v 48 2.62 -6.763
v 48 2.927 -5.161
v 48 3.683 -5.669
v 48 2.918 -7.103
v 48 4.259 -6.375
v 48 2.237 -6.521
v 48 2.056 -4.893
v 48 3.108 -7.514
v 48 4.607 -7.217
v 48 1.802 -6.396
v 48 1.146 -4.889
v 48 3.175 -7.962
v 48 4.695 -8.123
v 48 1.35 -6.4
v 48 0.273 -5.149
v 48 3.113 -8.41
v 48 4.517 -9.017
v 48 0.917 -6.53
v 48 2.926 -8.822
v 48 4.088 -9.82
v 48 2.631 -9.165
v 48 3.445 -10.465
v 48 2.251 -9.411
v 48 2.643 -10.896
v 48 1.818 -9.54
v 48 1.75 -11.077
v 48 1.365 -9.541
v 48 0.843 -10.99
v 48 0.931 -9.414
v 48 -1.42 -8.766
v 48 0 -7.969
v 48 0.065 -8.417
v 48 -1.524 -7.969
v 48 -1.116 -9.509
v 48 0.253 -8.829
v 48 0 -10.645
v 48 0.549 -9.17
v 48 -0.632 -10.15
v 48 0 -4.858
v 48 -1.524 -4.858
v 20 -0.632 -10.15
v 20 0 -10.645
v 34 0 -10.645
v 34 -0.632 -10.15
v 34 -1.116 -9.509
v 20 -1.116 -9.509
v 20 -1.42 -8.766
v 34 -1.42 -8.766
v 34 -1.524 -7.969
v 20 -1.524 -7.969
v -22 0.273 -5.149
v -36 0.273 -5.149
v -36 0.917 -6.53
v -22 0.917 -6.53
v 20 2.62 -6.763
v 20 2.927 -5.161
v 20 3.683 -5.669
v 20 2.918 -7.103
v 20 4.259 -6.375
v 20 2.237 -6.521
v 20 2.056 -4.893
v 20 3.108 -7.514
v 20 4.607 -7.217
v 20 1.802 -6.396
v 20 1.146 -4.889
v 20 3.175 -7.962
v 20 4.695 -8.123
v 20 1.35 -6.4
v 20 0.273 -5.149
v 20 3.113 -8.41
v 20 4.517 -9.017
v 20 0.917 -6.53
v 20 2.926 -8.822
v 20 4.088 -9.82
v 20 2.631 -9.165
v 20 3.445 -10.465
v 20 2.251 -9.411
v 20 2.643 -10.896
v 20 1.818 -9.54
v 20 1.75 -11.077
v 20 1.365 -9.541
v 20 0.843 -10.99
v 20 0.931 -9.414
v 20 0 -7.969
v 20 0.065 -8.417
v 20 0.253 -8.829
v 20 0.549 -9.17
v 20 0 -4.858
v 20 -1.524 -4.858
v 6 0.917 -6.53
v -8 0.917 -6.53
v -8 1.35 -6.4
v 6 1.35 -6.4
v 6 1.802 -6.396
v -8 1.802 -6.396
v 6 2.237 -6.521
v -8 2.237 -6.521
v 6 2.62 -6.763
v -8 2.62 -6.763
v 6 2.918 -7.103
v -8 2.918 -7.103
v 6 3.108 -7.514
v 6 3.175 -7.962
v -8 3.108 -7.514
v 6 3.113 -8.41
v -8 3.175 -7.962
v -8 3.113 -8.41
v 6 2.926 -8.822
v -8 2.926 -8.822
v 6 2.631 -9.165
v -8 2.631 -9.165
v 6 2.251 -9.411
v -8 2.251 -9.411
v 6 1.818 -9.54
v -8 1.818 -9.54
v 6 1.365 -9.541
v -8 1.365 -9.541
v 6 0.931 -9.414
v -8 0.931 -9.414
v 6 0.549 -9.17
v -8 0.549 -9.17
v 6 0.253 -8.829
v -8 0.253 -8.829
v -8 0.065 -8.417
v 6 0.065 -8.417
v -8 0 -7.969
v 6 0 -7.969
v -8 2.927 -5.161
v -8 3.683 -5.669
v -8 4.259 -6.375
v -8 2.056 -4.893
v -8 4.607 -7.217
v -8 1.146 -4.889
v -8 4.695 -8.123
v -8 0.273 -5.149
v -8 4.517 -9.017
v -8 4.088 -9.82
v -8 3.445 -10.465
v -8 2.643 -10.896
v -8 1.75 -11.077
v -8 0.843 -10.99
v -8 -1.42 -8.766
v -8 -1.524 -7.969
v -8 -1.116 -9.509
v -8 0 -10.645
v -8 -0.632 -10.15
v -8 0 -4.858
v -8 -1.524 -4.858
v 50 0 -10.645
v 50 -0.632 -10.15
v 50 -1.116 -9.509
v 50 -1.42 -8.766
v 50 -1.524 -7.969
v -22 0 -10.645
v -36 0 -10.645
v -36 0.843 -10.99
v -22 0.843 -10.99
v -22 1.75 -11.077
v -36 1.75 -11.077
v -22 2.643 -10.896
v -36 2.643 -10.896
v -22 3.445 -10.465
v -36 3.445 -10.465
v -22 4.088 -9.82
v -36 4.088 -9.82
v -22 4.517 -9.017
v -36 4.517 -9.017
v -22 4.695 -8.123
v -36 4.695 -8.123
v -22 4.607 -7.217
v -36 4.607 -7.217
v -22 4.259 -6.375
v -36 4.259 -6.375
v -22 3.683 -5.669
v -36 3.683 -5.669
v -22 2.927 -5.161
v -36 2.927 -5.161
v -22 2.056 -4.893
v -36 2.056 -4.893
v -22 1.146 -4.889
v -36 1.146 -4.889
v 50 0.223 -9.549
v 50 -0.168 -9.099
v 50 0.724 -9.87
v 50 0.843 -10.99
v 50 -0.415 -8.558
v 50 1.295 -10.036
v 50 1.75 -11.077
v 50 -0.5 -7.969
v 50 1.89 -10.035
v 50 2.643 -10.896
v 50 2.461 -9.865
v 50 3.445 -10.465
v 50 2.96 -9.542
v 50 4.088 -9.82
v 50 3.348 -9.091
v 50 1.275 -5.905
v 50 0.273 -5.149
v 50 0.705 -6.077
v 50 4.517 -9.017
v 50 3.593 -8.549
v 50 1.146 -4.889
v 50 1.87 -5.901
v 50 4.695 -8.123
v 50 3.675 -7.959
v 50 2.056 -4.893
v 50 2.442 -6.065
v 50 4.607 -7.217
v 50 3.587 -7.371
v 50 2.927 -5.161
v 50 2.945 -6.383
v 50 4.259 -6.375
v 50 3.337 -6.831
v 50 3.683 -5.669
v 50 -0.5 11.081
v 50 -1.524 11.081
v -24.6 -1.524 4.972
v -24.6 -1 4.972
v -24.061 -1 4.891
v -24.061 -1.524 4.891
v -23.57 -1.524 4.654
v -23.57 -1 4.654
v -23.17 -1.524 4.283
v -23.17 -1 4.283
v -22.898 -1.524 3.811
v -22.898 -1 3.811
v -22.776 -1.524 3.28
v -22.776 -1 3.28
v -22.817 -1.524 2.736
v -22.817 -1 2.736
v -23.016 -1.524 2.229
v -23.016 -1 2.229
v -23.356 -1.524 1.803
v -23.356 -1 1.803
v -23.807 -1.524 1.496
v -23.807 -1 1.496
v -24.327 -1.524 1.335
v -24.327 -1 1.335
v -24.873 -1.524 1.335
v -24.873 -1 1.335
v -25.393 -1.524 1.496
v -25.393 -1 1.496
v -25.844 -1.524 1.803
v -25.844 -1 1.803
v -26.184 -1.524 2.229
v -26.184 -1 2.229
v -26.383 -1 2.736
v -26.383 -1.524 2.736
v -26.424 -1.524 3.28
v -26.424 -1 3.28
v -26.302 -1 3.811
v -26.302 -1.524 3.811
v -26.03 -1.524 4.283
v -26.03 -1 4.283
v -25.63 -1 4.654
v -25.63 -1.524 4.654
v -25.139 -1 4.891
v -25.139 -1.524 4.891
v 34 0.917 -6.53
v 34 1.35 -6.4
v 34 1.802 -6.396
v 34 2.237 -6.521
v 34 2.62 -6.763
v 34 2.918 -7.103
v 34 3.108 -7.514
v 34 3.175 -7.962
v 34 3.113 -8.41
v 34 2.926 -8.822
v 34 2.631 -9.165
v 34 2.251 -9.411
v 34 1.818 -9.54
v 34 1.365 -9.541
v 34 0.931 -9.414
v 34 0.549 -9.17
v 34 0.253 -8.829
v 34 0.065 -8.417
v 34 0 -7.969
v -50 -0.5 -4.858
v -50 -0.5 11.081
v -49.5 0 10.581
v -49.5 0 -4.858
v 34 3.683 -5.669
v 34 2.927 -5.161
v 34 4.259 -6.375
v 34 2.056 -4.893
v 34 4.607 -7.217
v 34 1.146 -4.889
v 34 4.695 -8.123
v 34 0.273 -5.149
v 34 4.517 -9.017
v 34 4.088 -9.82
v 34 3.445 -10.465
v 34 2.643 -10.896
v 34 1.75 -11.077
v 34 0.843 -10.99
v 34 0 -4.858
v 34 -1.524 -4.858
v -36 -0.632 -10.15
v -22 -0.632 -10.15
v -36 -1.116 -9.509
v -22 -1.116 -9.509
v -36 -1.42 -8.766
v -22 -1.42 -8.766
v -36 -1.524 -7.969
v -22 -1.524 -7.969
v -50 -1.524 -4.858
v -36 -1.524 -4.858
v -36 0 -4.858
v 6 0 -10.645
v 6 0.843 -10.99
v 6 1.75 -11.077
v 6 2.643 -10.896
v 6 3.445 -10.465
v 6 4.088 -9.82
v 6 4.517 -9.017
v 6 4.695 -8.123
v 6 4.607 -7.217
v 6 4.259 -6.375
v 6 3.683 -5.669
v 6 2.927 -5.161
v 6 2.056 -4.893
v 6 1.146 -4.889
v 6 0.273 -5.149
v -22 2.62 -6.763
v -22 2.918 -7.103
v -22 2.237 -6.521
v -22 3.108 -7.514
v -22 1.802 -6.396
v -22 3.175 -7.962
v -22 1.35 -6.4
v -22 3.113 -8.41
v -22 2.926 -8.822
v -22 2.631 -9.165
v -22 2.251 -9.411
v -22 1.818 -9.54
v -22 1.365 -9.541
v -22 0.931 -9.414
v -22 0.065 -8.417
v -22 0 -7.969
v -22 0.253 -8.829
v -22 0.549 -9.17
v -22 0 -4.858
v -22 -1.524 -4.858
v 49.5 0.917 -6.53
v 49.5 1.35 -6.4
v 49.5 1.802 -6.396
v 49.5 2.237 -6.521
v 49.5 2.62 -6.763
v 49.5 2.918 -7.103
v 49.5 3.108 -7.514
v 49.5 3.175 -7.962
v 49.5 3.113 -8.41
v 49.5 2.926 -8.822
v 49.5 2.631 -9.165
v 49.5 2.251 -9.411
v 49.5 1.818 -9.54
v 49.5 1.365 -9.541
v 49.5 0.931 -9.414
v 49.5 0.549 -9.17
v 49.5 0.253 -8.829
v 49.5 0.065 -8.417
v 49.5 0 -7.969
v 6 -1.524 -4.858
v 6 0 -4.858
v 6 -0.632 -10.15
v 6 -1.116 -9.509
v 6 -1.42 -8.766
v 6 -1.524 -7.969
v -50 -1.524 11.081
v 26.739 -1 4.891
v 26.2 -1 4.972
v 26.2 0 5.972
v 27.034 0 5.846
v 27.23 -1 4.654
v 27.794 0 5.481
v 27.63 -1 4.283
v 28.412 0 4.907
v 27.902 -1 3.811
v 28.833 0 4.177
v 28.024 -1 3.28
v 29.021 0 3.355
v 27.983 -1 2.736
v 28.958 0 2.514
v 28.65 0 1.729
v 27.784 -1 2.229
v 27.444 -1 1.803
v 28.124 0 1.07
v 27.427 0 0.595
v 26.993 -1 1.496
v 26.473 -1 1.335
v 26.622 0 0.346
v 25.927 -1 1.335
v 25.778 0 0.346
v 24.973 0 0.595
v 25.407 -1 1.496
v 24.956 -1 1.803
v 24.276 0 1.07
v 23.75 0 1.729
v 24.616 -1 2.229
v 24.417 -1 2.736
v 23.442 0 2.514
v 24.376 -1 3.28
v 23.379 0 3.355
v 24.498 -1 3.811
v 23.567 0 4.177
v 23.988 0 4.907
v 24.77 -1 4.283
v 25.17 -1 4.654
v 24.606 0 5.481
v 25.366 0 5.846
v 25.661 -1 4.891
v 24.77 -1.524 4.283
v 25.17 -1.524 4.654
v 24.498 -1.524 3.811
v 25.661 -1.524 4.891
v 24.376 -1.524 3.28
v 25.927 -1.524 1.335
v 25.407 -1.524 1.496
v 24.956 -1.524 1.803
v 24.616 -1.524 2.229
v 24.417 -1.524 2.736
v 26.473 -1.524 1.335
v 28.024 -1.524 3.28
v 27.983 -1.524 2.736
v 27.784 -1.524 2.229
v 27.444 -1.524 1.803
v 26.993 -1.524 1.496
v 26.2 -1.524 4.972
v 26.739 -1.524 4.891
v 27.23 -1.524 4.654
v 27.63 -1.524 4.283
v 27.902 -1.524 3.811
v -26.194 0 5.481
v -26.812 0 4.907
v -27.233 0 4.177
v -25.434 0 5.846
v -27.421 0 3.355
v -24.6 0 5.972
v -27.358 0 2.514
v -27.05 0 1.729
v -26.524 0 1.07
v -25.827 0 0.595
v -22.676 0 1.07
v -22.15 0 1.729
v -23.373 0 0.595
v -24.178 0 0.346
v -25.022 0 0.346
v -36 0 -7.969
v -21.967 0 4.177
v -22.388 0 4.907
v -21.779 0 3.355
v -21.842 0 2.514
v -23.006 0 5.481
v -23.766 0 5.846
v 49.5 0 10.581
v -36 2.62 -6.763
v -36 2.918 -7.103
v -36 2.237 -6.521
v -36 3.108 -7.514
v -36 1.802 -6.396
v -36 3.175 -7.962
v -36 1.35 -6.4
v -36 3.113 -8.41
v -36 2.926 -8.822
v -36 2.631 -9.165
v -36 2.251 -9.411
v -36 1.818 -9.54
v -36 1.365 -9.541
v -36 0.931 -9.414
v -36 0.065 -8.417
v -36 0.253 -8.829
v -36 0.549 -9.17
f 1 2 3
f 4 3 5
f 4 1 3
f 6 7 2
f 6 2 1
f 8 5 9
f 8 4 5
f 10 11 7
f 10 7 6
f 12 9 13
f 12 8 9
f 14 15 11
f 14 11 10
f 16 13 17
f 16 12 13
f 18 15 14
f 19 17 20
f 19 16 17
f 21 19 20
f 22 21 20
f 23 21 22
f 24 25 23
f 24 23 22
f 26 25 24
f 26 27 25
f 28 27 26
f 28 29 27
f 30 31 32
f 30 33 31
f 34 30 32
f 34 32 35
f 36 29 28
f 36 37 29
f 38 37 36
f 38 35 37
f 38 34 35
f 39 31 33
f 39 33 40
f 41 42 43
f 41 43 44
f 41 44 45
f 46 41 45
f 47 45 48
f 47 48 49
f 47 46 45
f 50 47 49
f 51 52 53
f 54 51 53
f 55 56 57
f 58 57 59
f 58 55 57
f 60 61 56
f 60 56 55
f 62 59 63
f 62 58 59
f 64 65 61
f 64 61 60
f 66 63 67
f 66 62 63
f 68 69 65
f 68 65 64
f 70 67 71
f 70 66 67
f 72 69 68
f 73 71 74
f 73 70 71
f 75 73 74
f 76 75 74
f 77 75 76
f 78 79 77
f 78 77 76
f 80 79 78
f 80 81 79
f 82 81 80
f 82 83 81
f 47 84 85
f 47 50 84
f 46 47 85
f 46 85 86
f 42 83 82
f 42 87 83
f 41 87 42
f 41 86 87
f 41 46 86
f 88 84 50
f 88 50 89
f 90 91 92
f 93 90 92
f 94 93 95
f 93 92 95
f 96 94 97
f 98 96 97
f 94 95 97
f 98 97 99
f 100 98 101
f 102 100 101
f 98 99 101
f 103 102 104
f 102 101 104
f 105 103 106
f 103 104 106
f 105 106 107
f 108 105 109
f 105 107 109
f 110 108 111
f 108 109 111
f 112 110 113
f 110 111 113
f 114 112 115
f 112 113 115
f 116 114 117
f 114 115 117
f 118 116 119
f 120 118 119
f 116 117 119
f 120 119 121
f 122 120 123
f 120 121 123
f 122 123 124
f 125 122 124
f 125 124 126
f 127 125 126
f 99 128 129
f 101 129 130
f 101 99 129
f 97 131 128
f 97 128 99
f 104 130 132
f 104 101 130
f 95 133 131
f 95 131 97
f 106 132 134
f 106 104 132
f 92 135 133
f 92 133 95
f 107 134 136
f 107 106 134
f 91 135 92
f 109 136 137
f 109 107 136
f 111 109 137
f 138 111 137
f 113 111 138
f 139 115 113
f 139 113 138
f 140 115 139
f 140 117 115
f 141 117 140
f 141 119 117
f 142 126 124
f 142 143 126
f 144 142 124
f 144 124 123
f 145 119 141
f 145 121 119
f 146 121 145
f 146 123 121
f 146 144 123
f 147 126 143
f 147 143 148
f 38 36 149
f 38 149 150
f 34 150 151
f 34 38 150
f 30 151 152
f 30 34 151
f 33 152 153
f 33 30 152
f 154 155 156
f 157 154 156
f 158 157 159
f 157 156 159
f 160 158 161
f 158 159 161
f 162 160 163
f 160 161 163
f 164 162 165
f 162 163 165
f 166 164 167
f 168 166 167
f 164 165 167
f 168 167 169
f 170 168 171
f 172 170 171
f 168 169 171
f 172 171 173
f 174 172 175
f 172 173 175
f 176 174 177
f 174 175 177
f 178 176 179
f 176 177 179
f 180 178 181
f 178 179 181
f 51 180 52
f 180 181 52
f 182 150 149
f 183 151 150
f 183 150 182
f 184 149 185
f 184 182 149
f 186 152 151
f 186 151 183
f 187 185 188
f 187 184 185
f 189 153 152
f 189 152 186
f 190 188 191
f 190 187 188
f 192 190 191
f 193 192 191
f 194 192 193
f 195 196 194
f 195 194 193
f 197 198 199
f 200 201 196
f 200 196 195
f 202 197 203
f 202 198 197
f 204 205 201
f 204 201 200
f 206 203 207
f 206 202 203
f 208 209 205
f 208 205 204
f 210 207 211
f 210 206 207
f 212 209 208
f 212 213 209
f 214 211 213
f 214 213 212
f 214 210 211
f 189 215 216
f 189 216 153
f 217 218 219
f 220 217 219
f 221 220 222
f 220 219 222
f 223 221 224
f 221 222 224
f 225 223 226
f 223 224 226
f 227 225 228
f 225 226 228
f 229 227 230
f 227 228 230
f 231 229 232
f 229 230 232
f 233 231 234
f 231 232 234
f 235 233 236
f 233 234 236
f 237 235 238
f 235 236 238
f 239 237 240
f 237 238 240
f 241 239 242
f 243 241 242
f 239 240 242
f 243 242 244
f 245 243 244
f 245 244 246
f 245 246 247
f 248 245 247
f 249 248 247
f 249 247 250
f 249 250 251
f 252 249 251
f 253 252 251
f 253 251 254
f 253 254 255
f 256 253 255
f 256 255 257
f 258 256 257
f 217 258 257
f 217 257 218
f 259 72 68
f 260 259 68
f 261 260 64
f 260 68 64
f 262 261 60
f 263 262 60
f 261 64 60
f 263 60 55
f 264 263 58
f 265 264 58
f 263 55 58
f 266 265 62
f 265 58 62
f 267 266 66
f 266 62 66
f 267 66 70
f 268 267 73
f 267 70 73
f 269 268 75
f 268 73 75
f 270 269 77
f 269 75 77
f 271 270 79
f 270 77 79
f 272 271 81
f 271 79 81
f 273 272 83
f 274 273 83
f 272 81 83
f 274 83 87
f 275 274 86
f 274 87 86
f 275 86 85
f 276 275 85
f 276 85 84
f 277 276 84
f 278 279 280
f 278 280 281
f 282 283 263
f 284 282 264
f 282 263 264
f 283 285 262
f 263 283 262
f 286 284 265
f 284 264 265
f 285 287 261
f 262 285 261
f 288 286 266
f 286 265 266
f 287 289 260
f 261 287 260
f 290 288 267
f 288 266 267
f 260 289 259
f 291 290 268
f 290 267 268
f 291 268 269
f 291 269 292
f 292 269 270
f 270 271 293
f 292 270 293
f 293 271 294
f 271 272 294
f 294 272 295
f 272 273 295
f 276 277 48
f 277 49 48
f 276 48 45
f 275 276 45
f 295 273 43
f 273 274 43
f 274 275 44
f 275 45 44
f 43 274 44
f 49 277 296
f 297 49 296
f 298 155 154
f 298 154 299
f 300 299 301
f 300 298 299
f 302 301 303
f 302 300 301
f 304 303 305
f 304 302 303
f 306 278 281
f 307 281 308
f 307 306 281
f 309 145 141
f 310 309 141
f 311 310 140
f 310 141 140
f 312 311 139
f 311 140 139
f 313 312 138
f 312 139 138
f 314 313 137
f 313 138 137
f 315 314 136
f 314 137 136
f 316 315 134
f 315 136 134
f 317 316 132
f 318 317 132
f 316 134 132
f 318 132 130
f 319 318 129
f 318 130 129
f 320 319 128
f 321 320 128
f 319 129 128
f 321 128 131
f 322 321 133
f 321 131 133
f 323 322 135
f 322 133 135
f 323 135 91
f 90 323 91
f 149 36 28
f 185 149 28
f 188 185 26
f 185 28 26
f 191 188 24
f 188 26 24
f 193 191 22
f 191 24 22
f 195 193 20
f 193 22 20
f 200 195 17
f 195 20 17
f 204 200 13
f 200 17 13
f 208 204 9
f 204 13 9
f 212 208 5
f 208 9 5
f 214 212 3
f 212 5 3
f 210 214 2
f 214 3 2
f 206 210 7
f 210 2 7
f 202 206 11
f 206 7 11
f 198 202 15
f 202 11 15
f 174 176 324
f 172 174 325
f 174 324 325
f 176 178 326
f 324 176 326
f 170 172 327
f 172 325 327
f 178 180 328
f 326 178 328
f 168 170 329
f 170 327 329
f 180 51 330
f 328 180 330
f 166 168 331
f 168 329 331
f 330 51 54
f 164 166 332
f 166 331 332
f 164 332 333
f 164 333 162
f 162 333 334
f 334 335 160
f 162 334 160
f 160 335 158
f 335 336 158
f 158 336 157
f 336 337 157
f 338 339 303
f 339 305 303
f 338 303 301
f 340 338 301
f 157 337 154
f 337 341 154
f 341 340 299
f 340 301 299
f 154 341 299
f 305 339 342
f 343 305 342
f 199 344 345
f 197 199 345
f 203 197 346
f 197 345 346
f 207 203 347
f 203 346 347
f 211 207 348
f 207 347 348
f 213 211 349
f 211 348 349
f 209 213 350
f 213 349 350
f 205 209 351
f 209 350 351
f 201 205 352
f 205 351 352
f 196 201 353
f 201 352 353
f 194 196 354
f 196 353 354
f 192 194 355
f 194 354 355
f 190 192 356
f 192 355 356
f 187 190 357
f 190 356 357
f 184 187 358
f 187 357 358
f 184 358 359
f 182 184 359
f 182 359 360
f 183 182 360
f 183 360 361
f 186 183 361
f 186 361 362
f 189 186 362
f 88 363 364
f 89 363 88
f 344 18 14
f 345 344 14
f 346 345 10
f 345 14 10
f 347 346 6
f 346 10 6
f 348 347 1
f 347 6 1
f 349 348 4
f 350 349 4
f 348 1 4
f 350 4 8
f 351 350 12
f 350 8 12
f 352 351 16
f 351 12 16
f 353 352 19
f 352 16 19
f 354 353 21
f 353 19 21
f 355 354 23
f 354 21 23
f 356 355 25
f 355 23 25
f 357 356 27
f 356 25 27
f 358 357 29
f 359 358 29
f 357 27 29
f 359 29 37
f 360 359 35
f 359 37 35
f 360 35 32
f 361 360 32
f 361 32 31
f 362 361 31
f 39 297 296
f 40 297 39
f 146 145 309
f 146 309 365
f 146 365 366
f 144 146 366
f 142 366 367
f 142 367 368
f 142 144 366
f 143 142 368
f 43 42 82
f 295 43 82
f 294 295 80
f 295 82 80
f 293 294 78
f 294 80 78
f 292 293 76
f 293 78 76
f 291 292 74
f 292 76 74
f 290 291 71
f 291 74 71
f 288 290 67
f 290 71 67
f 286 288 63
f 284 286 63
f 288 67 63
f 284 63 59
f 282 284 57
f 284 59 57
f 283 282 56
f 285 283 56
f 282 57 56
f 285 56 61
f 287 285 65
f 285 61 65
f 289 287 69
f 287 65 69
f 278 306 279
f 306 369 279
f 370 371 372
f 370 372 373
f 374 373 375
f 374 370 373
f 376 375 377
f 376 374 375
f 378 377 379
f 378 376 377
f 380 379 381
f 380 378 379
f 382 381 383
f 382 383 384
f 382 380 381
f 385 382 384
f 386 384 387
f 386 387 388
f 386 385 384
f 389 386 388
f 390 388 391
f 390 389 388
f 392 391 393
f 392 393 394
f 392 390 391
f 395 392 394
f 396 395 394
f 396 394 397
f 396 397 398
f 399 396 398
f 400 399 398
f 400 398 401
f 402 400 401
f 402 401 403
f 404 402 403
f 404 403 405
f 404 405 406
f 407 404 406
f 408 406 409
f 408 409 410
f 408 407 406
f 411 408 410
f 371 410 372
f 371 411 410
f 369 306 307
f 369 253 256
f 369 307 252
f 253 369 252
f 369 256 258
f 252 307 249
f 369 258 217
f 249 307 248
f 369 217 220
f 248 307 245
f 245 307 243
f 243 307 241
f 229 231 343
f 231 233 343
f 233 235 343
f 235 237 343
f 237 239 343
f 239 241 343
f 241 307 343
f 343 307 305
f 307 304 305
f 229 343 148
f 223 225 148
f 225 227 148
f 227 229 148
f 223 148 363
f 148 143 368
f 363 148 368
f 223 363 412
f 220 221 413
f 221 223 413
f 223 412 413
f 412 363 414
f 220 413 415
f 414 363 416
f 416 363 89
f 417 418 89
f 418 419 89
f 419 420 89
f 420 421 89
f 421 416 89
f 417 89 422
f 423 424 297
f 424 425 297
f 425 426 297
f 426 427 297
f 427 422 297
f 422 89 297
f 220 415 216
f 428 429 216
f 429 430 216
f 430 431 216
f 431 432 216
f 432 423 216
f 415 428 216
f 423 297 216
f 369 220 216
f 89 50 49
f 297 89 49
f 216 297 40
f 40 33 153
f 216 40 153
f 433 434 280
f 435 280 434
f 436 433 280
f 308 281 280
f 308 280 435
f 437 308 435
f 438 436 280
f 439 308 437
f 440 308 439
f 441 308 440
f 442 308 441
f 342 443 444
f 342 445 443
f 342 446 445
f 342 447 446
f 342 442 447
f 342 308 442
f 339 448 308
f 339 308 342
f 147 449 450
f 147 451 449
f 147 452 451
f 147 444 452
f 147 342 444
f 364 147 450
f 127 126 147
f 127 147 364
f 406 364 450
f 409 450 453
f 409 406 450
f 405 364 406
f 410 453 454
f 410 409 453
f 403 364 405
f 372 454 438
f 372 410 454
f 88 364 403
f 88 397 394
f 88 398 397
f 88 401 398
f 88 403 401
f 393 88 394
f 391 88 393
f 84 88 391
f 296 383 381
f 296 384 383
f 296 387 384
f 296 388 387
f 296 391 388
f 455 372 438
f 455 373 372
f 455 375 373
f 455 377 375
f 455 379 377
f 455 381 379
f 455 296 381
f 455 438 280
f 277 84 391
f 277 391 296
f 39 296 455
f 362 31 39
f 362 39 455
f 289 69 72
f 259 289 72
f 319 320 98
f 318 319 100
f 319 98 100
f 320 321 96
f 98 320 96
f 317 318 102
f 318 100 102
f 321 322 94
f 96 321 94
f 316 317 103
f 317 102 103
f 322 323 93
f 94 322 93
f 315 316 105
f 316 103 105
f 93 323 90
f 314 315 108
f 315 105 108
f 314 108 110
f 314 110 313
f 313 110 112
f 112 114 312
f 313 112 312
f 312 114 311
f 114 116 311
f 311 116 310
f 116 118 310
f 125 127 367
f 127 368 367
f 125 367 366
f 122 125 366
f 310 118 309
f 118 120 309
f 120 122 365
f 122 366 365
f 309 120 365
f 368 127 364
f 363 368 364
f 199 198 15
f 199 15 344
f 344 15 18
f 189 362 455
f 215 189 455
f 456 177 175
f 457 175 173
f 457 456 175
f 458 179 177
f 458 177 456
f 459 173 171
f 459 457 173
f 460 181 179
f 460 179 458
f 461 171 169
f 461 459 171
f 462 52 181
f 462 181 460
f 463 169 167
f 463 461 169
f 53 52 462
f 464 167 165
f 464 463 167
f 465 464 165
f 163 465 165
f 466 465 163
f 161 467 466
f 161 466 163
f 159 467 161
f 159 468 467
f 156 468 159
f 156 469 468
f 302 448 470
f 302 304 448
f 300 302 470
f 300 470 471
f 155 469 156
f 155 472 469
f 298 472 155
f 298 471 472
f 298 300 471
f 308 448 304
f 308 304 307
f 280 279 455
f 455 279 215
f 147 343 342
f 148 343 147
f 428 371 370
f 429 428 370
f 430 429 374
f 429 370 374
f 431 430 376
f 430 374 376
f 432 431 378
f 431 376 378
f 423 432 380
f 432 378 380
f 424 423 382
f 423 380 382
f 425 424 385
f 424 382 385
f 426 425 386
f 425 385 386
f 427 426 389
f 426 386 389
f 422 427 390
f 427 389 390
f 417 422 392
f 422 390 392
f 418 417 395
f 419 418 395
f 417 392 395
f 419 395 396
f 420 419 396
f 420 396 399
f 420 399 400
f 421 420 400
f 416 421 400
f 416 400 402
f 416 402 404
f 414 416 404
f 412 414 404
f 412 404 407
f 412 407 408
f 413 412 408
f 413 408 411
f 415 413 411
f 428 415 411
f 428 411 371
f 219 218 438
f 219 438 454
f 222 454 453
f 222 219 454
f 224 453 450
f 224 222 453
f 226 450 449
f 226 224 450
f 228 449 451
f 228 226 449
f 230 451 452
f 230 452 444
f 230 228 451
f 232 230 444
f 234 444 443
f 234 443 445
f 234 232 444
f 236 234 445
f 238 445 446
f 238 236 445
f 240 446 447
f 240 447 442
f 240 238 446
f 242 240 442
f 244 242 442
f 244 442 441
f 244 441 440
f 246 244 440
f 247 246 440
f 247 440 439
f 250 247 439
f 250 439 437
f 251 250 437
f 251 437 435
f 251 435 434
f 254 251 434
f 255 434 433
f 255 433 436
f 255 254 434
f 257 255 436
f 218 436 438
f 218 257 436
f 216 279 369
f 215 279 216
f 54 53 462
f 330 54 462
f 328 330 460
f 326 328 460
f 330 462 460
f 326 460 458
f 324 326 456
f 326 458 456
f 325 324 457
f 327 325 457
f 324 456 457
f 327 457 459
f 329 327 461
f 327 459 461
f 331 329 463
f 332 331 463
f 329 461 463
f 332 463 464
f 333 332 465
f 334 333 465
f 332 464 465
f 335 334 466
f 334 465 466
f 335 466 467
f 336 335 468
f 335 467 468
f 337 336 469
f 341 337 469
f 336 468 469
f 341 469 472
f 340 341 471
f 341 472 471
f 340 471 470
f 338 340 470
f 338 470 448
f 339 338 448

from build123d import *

# Parameters (mm, degrees)
SKETCH1_W          = 100
SKETCH1_H          = 22.1615
BASE_FLANGE1_DEPTH = 1.524
HEM1_START         = -50
HEM1_DEPTH         = 100
HEM1_2_DEPTH       = 100
CUT_EXTRUDE1_START = -52.42823759
SKETCH8_W          = 14
SKETCH8_H          = 6.223
CUT_EXTRUDE1_DEPTH = 94.856475179
LPATTERN1_COUNT    = 11
LPATTERN1_PITCH    = 28
CHAMFER1_SIZE      = 0.5
SKETCH9_R          = 1.8288
CUT_EXTRUDE2_DEPTH = 10
LPATTERN2_COUNT    = 6
LPATTERN2_PITCH    = 50.8
CHAMFER2_SIZE      = 1


# Read off the part's stored shape, not the designer's step: Hem1
# Sheet-metal steps are written as plain solids
with BuildPart() as part:
    # Sketch1 → Base-Flange1 (new body)
    with BuildSketch(Plane(origin=(0, 0, 0), x_dir=(1, 0, 0), z_dir=(0, 1, 0))):
        Rectangle(SKETCH1_W, SKETCH1_H)
    extrude(amount=-BASE_FLANGE1_DEPTH)

    # Hem1 outline → Hem1 (cut)
    with BuildSketch(Plane.YZ.offset(HEM1_START)):
        with BuildLine():
            Line((0, -11.08075), (0, -10.645306054))
            ThreePointArc((0, -10.645306054), (-1.116287945, -9.509043168), (-1.524, -7.96925))
            Line((-1.524, -7.96925), (-1.524, -11.08075))
            Line((-1.524, -11.08075), (0, -11.08075))
        make_face()
    extrude(amount=HEM1_DEPTH, mode=Mode.SUBTRACT)

    # Hem1 2 outline → Hem1 2 (add)
    with BuildSketch(Plane.YZ.offset(HEM1_START)):
        with BuildLine():
            Line((0.272523279, -5.149273321), (0.916593509, -6.530486388))
            ThreePointArc((0.916593509, -6.530486388), (2.92638392, -8.822213128), (0, -7.96925))
            Line((0, -7.96925), (0, -10.645306054))
            ThreePointArc((0, -10.645306054), (4.69518189, -8.123345818), (0.272523279, -5.149273321))
        make_face()
    extrude(amount=HEM1_2_DEPTH)

    # Sketch8 → Cut-Extrude1 (cut)
    with BuildSketch(Plane(origin=(0, 0, 0), x_dir=(1, 0, 0), z_dir=(0, 1, 0)).offset(CUT_EXTRUDE1_START)):
        with Locations((-43, 7.96925)):
            Rectangle(SKETCH8_W, SKETCH8_H)
    cut_extrude1 = extrude(amount=CUT_EXTRUDE1_DEPTH, mode=Mode.SUBTRACT)

    # LPattern1: Cut-Extrude1 ×11
    with Locations(*[(i * LPATTERN1_PITCH, 0, 0) for i in range(1, LPATTERN1_COUNT)]):
        add(cut_extrude1, mode=Mode.SUBTRACT)

    # Chamfer1
    chamfer1_edges = [part.edges().sort_by_distance(p)[0] for p in [
        (50, 2.92638392, -8.822213128),
        (-50, 0, 3.1115),
        (0, 0, 11.08075),
        (50, 0, 1.55575),
    ]]
    chamfer(chamfer1_edges, length=CHAMFER1_SIZE)

    # Sketch9 → Cut-Extrude2 (cut)
    with BuildSketch(Plane(origin=(0, 0, 0), x_dir=(1, 0, 0), z_dir=(0, 1, 0))):
        with Locations(Location((-24.6, -3.14325, 0), (0, 0, 270))):
            Circle(SKETCH9_R)
    cut_extrude2 = extrude(amount=-CUT_EXTRUDE2_DEPTH, mode=Mode.SUBTRACT)

    # LPattern2: Cut-Extrude2 ×6
    with Locations(*[(i * LPATTERN2_PITCH, 0, 0) for i in range(1, LPATTERN2_COUNT)]):
        add(cut_extrude2, mode=Mode.SUBTRACT)

    # Chamfer2
    chamfer2_edges = [part.edges().sort_by_distance(p)[0] for p in [
        (-24.6, 0, 1.31445),
        (26.2, 0, 1.31445),
    ]]
    chamfer(chamfer2_edges, length=CHAMFER2_SIZE)


solid = part.part
